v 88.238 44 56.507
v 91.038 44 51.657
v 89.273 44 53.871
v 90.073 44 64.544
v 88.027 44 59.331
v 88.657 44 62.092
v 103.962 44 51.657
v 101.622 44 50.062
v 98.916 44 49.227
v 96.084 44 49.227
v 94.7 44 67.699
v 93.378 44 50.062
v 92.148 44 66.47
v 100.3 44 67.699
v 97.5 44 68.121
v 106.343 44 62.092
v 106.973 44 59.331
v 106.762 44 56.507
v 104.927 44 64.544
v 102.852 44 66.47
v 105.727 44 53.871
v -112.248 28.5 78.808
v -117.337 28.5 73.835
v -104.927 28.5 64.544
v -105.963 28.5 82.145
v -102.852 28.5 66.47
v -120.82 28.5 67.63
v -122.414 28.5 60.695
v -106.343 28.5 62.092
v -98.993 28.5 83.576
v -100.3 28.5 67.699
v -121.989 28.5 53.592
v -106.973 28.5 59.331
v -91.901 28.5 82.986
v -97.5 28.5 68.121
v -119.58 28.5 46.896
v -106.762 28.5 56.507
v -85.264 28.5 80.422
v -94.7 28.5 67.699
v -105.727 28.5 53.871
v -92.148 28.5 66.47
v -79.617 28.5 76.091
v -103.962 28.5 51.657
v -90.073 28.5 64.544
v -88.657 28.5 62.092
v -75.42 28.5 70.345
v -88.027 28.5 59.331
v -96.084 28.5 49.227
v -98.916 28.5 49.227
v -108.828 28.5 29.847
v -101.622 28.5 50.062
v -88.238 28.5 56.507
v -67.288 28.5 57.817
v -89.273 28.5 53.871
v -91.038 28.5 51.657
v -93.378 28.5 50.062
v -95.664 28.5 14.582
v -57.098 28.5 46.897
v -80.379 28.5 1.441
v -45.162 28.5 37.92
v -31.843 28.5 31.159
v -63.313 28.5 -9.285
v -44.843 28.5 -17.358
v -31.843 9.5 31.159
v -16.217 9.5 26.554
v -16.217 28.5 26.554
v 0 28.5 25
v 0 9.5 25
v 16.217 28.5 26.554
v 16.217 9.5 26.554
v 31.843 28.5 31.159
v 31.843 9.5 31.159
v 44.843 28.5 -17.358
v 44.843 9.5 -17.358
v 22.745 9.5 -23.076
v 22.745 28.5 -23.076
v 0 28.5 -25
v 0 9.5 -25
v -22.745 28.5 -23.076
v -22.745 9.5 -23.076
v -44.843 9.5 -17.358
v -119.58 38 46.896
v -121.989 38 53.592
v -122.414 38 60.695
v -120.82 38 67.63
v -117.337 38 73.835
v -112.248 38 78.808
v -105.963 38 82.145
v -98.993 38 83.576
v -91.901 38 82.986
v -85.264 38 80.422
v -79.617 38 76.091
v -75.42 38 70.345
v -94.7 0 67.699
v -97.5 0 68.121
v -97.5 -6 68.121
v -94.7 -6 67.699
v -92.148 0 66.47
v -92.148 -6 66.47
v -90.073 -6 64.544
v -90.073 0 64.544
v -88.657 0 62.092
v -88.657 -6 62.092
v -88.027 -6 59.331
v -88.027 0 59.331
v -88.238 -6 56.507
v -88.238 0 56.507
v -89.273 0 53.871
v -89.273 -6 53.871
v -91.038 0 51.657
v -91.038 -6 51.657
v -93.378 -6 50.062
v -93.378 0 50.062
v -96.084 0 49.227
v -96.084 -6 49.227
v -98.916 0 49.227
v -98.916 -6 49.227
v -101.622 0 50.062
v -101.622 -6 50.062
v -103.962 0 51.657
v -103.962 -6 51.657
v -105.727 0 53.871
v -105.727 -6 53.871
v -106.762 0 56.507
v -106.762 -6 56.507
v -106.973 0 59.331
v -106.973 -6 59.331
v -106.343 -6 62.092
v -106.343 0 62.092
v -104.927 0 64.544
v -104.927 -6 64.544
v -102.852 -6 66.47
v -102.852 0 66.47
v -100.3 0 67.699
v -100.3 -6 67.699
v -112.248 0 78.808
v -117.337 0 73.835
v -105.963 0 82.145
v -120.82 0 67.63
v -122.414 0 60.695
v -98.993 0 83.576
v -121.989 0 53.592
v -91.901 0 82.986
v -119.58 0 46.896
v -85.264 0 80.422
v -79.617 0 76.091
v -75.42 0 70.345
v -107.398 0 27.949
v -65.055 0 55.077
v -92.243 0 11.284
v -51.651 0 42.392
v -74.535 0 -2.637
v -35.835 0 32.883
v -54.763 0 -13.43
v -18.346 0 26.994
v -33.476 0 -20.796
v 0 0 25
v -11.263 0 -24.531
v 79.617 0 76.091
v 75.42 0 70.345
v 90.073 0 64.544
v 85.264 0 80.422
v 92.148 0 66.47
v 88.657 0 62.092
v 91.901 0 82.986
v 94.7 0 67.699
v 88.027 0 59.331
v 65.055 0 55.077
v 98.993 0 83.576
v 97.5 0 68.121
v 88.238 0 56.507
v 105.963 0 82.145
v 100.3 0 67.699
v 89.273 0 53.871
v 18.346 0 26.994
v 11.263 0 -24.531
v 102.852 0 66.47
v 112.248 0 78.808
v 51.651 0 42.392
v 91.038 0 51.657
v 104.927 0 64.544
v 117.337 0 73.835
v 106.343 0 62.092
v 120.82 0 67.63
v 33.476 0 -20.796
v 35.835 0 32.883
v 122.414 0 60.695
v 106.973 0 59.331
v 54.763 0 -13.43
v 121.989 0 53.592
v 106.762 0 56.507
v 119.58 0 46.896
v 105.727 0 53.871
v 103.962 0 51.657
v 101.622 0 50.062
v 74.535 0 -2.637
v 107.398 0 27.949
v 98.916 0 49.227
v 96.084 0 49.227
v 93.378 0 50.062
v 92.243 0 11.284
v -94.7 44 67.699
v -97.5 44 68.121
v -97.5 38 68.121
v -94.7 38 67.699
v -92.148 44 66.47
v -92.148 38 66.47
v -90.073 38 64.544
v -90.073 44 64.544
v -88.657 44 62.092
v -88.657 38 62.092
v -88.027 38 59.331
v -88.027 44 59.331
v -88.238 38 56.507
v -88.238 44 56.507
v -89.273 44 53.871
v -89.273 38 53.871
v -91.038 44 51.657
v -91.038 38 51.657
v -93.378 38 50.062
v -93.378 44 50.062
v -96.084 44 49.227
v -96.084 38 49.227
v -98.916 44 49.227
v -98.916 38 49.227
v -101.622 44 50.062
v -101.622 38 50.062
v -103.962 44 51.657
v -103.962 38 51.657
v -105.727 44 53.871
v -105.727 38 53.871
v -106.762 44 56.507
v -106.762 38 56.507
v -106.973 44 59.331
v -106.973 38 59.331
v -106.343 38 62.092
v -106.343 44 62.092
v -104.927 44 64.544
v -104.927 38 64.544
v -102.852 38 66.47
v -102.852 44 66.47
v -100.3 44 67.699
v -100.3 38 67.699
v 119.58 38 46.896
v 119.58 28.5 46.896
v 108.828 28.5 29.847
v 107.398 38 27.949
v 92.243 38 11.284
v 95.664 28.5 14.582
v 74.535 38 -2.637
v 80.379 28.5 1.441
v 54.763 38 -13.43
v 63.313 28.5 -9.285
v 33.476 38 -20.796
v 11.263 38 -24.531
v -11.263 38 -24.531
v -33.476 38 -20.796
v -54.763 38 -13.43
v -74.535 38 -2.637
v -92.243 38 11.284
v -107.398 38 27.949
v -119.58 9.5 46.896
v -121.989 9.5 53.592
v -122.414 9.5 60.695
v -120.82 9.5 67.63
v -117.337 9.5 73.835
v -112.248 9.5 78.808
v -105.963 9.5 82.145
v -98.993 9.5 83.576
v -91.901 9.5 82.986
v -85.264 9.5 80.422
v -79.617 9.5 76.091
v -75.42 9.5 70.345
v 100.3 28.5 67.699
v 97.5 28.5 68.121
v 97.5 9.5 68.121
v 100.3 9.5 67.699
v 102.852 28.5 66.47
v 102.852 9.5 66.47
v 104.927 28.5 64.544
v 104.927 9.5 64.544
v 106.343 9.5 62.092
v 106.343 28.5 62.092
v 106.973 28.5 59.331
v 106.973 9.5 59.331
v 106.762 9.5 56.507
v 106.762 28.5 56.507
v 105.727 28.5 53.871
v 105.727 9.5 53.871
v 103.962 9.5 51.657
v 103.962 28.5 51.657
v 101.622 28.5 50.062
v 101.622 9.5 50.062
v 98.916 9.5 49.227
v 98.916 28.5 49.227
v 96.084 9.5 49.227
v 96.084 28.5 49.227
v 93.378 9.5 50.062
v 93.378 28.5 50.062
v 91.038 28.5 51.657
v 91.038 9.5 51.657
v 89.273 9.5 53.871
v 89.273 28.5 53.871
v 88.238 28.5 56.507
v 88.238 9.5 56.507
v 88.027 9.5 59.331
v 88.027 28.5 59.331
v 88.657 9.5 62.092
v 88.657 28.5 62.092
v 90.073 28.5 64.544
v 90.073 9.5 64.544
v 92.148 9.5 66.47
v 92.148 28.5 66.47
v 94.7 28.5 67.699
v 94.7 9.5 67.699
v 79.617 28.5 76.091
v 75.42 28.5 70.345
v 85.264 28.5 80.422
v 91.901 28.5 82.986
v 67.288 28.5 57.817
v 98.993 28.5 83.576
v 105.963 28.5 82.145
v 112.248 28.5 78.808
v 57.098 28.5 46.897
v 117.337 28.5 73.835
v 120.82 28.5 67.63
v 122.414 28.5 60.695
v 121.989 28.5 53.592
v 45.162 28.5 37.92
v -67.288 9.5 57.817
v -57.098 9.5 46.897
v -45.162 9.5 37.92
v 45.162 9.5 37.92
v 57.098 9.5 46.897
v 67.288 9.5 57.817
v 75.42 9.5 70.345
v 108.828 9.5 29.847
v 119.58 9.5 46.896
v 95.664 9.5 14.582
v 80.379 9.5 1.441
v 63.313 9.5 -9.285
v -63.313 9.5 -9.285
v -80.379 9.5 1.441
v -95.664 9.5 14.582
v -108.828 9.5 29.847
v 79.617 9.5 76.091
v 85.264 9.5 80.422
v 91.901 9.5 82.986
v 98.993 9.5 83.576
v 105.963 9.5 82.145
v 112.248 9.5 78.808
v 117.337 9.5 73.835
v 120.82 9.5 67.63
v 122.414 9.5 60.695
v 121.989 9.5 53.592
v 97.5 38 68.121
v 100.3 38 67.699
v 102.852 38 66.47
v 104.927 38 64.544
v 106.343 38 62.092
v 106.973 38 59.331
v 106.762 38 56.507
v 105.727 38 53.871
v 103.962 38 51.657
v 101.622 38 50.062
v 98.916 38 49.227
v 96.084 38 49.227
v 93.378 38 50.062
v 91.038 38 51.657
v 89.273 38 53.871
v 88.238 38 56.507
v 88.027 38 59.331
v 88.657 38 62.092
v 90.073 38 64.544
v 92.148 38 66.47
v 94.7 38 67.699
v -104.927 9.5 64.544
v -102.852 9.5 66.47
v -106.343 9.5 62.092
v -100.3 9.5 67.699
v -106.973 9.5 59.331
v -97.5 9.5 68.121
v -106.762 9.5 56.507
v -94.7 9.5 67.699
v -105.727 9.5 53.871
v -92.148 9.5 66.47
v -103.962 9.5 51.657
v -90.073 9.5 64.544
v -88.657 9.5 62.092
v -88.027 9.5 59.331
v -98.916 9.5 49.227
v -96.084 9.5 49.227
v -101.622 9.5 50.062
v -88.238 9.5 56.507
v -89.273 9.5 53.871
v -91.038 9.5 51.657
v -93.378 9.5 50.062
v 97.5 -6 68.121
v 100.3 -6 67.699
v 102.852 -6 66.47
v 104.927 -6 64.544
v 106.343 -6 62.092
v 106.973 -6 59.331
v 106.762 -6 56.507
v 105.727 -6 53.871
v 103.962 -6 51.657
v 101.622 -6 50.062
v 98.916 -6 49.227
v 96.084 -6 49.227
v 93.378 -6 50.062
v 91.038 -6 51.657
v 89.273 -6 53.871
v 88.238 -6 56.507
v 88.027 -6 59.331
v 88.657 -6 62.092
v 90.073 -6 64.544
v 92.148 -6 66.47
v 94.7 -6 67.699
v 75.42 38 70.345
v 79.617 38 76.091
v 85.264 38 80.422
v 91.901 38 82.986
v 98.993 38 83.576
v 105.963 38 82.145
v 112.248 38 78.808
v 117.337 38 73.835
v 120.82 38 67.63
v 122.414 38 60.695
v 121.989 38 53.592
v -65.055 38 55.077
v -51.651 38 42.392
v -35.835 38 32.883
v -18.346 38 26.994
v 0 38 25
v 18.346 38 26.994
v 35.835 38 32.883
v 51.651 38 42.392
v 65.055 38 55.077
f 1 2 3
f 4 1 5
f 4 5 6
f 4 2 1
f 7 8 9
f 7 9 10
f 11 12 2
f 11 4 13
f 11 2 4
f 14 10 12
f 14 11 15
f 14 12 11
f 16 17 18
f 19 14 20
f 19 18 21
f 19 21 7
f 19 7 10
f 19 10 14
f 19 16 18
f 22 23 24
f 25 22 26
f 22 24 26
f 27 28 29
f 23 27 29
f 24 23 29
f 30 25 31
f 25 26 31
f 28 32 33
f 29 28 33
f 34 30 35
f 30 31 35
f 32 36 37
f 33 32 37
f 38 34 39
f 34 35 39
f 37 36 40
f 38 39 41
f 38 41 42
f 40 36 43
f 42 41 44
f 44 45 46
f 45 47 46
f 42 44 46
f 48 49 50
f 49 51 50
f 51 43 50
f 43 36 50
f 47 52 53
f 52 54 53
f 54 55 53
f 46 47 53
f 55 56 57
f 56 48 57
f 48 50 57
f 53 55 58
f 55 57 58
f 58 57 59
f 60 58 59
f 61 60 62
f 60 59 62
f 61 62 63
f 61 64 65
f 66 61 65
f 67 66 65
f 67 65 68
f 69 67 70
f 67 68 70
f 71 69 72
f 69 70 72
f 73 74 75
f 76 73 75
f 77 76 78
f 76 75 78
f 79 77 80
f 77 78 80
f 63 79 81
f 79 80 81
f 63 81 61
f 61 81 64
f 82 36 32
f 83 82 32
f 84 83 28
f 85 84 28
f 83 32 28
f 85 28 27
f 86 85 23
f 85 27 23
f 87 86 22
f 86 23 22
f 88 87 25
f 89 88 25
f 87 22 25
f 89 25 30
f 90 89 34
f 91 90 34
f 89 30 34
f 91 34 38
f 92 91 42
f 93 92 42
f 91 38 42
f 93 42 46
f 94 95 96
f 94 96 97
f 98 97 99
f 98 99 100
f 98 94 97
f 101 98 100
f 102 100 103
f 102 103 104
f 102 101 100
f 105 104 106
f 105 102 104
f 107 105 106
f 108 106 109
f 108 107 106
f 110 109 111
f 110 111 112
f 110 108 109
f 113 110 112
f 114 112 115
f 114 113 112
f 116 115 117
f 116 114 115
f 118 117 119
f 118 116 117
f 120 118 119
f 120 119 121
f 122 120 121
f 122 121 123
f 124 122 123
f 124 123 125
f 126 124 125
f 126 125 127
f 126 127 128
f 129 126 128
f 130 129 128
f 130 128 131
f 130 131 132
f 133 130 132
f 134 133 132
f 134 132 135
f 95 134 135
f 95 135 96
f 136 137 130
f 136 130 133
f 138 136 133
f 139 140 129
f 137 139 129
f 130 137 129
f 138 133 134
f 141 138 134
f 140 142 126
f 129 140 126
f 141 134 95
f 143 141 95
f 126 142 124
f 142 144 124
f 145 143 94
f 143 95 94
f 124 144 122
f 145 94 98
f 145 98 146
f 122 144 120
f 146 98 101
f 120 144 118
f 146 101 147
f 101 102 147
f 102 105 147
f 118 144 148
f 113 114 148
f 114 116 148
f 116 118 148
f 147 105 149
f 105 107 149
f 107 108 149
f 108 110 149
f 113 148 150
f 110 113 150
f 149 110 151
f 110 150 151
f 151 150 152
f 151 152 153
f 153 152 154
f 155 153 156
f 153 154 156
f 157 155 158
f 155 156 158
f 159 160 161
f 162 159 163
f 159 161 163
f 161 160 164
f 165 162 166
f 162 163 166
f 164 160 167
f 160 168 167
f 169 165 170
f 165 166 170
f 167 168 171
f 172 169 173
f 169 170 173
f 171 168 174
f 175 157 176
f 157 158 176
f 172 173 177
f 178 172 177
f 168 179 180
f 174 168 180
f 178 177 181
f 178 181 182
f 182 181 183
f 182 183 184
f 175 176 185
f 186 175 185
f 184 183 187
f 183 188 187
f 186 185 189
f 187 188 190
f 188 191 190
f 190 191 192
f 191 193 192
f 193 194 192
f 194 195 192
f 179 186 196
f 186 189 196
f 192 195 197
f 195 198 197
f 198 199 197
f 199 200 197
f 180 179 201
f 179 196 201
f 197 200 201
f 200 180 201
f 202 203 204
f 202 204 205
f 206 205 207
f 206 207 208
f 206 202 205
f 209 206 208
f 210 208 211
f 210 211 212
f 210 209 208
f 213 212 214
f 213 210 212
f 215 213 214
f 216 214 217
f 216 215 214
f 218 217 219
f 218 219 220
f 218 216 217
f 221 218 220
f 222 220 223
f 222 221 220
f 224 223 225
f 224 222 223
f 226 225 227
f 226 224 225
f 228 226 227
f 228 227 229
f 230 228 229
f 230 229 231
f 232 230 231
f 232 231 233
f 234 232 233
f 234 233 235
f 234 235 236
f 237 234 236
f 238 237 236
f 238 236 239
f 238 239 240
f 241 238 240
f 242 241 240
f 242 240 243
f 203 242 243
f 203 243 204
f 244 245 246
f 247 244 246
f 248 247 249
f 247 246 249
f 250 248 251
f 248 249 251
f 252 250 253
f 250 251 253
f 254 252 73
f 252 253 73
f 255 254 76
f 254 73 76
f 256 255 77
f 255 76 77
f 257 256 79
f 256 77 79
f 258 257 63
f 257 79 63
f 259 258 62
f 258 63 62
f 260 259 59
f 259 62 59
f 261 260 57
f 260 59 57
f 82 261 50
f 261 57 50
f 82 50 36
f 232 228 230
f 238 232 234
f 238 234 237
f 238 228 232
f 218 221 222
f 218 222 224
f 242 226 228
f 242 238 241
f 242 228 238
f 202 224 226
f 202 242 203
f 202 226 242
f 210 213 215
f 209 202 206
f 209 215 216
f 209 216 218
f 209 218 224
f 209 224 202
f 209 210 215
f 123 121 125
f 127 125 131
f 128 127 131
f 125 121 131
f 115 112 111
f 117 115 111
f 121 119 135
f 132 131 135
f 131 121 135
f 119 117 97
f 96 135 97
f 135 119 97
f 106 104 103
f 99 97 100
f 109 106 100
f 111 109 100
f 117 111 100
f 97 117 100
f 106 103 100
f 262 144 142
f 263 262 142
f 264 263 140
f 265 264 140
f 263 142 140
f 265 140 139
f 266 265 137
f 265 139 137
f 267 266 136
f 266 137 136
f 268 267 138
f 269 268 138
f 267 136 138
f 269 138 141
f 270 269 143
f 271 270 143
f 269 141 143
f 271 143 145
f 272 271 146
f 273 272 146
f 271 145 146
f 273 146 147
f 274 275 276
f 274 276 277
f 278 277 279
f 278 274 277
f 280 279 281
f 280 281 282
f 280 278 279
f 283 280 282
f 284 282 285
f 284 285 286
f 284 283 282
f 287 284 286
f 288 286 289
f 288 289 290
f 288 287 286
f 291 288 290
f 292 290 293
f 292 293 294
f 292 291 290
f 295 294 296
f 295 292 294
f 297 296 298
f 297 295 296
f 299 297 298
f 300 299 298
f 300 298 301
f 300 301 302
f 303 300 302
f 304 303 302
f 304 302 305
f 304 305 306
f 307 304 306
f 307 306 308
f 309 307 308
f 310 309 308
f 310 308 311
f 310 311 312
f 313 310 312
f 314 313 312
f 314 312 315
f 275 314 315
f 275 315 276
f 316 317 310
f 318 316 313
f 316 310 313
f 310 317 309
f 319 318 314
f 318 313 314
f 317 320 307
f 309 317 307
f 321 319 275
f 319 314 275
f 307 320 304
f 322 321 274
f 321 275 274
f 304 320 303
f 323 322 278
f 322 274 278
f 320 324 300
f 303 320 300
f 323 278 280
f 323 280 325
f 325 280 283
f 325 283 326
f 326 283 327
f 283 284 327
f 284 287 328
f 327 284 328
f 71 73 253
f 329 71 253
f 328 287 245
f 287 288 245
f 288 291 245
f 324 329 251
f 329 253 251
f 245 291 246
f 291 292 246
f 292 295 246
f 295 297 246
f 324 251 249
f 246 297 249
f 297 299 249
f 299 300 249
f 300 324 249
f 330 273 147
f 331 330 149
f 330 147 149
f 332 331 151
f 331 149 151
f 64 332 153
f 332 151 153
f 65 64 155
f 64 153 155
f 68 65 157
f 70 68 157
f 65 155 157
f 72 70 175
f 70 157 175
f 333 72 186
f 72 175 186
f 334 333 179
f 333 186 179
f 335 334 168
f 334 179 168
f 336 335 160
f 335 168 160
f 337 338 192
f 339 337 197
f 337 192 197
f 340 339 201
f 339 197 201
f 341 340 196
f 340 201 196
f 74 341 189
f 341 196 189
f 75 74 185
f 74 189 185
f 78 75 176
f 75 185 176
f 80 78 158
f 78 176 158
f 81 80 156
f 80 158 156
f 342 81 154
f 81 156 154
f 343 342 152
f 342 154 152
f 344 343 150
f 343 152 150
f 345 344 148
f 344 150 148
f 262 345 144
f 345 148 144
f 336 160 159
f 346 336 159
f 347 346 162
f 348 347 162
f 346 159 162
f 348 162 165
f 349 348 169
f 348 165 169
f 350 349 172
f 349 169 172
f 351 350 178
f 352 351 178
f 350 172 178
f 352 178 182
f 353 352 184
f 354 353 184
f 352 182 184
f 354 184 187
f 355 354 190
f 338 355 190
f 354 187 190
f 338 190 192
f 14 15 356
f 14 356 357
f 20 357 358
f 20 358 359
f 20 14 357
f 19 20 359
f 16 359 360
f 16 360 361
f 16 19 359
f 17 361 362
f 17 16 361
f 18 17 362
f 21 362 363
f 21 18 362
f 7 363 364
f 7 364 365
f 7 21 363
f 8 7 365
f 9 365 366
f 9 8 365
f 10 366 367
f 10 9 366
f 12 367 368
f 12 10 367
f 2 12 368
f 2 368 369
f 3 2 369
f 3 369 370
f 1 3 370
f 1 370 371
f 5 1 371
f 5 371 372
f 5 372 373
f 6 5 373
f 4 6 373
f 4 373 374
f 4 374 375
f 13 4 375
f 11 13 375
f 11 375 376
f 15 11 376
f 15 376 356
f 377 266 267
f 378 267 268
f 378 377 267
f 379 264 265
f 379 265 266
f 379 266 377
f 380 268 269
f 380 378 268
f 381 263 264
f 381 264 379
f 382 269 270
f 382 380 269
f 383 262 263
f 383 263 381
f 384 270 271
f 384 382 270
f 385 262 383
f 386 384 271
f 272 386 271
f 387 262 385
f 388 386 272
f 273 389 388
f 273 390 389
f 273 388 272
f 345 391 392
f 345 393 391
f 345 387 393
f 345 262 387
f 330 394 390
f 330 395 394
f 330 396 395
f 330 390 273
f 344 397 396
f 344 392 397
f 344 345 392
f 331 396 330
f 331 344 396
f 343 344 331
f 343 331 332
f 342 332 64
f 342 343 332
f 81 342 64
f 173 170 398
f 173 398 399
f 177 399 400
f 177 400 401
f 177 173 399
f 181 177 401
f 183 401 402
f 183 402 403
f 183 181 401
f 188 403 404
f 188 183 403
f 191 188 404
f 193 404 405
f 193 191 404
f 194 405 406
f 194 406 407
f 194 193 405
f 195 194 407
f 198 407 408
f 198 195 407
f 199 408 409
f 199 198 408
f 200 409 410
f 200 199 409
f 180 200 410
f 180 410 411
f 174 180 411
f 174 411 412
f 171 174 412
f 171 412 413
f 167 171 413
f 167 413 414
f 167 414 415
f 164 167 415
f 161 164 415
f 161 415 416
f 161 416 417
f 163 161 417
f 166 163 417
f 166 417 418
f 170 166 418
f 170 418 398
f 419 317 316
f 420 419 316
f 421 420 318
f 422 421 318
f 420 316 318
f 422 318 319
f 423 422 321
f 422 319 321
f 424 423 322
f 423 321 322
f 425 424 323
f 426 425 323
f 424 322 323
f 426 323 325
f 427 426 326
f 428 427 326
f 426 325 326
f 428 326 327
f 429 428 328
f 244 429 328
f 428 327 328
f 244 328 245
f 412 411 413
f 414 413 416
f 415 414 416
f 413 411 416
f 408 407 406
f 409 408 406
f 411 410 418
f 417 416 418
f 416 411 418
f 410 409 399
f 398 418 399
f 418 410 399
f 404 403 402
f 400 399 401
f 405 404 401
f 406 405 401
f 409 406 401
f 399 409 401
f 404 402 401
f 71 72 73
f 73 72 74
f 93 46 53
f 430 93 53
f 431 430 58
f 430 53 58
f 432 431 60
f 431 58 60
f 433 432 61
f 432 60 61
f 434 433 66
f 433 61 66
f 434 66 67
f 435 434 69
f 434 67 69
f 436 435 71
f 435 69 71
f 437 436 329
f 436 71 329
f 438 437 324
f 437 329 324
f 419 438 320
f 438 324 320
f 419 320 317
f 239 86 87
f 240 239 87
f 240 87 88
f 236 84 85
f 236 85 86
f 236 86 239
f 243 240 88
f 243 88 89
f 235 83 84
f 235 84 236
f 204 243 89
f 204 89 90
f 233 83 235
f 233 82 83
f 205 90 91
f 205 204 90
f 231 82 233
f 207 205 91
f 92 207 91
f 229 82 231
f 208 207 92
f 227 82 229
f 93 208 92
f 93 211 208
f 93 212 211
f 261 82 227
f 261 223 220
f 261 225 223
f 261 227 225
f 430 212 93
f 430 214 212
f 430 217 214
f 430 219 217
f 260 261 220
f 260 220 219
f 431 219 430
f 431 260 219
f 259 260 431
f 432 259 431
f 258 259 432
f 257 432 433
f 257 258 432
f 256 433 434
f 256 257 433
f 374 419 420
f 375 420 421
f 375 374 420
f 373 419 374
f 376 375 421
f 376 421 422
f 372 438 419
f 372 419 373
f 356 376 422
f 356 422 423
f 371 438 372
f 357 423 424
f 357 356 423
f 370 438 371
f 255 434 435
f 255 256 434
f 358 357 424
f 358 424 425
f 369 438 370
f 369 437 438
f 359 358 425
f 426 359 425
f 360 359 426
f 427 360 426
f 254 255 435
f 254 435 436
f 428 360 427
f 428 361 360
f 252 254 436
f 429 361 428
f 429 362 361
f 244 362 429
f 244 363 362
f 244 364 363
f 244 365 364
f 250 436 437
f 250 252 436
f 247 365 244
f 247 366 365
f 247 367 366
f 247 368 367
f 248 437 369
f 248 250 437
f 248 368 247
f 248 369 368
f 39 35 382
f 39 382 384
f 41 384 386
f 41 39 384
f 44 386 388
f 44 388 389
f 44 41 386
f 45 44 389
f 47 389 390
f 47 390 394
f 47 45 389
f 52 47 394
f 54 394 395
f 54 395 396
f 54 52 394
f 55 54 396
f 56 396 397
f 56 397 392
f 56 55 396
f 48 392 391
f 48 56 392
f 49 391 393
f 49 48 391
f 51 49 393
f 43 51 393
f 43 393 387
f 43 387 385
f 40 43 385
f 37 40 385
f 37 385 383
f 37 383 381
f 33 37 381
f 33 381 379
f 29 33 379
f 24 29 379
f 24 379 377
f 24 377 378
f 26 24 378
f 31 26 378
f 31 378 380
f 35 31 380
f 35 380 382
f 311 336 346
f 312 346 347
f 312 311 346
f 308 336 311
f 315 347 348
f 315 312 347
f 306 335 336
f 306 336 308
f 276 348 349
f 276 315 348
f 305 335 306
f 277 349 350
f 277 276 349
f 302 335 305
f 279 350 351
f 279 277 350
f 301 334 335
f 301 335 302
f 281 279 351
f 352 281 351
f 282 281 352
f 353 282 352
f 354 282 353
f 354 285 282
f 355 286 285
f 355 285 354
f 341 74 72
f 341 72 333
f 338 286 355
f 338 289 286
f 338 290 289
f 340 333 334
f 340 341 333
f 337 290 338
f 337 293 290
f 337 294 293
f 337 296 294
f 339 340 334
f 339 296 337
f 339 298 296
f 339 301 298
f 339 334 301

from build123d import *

# Parameters (mm, degrees)
BOSS_EXTRUDE1_DEPTH = 9.5
BOSS_EXTRUDE2_DEPTH = 19
BOSS_EXTRUDE3_DEPTH = 9.5
SKETCH5_R           = 9.5
CUT_EXTRUDE1_DEPTH  = 154.110072724
BOSS_EXTRUDE4_START = 6
SKETCH5_2_R         = 9.5
BOSS_EXTRUDE4_DEPTH = 50


with BuildPart() as part:
    # Sketch2 → Boss-Extrude1 (new body)
    with BuildSketch(Plane(origin=(0, 0, 0), x_dir=(1, 0, 0), z_dir=(0, 1, 0))):
        with BuildLine():
            ThreePointArc((119.580217293, -46.896332496), (0, 25), (-119.580217293, -46.896332496))
            ThreePointArc((-119.580217293, -46.896332496), (-109.224504437, -80.701054226), (-75.419782707, -70.34534137))
            ThreePointArc((-75.419782707, -70.34534137), (0, -25), (75.419782707, -70.34534137))
            ThreePointArc((75.419782707, -70.34534137), (109.224504437, -80.701054226), (119.580217293, -46.896332496))
        make_face()
    extrude(amount=BOSS_EXTRUDE1_DEPTH)

    # Sketch3 → Boss-Extrude2 (add)
    with BuildSketch(Plane(origin=(0, 9.5, 0), x_dir=(1, 0, 0), z_dir=(0, 1, 0))):
        with BuildLine():
            Line((-44.843451744, 17.358040295), (-31.843255272, -31.159353446))
            ThreePointArc((-31.843255272, -31.159353446), (0, -25), (31.843255272, -31.159353446))
            Line((31.843255272, -31.159353446), (44.843451744, 17.358040295))
            ThreePointArc((44.843451744, 17.358040295), (0, 25), (-44.843451744, 17.358040295))
        make_face()
    extrude(amount=BOSS_EXTRUDE2_DEPTH)

    # Sketch4 → Boss-Extrude3 (add)
    with BuildSketch(Plane(origin=(0, 28.5, 0), x_dir=(1, 0, 0), z_dir=(0, 1, 0))):
        with BuildLine():
            ThreePointArc((119.580217293, -46.896332496), (0, 25), (-119.580217293, -46.896332496))
            ThreePointArc((-119.580217293, -46.896332496), (-109.224504437, -80.701054226), (-75.419782707, -70.34534137))
            ThreePointArc((-75.419782707, -70.34534137), (0, -25), (75.419782707, -70.34534137))
            ThreePointArc((75.419782707, -70.34534137), (109.224504437, -80.701054226), (119.580217293, -46.896332496))
        make_face()
    extrude(amount=BOSS_EXTRUDE3_DEPTH)

    # Sketch5 → Cut-Extrude1 (cut, through all)
    with BuildSketch(Plane(origin=(0, 38, 0), x_dir=(1, 0, 0), z_dir=(0, 1, 0))):
        with Locations((-97.5, -58.620836933)):
            Circle(SKETCH5_R)
        with Locations((97.5, -58.620836933)):
            Circle(SKETCH5_R)
    extrude(amount=-CUT_EXTRUDE1_DEPTH, mode=Mode.SUBTRACT)

    # Sketch5<2> → Boss-Extrude4 (add)
    with BuildSketch(Plane(origin=(0, 38, 0), x_dir=(1, 0, 0), z_dir=(0, 1, 0)).offset(BOSS_EXTRUDE4_START)):
        with Locations((-97.5, -58.620836933)):
            Circle(SKETCH5_2_R)
        with Locations((97.5, -58.620836933)):
            Circle(SKETCH5_2_R)
    extrude(amount=-BOSS_EXTRUDE4_DEPTH)


solid = part.part
